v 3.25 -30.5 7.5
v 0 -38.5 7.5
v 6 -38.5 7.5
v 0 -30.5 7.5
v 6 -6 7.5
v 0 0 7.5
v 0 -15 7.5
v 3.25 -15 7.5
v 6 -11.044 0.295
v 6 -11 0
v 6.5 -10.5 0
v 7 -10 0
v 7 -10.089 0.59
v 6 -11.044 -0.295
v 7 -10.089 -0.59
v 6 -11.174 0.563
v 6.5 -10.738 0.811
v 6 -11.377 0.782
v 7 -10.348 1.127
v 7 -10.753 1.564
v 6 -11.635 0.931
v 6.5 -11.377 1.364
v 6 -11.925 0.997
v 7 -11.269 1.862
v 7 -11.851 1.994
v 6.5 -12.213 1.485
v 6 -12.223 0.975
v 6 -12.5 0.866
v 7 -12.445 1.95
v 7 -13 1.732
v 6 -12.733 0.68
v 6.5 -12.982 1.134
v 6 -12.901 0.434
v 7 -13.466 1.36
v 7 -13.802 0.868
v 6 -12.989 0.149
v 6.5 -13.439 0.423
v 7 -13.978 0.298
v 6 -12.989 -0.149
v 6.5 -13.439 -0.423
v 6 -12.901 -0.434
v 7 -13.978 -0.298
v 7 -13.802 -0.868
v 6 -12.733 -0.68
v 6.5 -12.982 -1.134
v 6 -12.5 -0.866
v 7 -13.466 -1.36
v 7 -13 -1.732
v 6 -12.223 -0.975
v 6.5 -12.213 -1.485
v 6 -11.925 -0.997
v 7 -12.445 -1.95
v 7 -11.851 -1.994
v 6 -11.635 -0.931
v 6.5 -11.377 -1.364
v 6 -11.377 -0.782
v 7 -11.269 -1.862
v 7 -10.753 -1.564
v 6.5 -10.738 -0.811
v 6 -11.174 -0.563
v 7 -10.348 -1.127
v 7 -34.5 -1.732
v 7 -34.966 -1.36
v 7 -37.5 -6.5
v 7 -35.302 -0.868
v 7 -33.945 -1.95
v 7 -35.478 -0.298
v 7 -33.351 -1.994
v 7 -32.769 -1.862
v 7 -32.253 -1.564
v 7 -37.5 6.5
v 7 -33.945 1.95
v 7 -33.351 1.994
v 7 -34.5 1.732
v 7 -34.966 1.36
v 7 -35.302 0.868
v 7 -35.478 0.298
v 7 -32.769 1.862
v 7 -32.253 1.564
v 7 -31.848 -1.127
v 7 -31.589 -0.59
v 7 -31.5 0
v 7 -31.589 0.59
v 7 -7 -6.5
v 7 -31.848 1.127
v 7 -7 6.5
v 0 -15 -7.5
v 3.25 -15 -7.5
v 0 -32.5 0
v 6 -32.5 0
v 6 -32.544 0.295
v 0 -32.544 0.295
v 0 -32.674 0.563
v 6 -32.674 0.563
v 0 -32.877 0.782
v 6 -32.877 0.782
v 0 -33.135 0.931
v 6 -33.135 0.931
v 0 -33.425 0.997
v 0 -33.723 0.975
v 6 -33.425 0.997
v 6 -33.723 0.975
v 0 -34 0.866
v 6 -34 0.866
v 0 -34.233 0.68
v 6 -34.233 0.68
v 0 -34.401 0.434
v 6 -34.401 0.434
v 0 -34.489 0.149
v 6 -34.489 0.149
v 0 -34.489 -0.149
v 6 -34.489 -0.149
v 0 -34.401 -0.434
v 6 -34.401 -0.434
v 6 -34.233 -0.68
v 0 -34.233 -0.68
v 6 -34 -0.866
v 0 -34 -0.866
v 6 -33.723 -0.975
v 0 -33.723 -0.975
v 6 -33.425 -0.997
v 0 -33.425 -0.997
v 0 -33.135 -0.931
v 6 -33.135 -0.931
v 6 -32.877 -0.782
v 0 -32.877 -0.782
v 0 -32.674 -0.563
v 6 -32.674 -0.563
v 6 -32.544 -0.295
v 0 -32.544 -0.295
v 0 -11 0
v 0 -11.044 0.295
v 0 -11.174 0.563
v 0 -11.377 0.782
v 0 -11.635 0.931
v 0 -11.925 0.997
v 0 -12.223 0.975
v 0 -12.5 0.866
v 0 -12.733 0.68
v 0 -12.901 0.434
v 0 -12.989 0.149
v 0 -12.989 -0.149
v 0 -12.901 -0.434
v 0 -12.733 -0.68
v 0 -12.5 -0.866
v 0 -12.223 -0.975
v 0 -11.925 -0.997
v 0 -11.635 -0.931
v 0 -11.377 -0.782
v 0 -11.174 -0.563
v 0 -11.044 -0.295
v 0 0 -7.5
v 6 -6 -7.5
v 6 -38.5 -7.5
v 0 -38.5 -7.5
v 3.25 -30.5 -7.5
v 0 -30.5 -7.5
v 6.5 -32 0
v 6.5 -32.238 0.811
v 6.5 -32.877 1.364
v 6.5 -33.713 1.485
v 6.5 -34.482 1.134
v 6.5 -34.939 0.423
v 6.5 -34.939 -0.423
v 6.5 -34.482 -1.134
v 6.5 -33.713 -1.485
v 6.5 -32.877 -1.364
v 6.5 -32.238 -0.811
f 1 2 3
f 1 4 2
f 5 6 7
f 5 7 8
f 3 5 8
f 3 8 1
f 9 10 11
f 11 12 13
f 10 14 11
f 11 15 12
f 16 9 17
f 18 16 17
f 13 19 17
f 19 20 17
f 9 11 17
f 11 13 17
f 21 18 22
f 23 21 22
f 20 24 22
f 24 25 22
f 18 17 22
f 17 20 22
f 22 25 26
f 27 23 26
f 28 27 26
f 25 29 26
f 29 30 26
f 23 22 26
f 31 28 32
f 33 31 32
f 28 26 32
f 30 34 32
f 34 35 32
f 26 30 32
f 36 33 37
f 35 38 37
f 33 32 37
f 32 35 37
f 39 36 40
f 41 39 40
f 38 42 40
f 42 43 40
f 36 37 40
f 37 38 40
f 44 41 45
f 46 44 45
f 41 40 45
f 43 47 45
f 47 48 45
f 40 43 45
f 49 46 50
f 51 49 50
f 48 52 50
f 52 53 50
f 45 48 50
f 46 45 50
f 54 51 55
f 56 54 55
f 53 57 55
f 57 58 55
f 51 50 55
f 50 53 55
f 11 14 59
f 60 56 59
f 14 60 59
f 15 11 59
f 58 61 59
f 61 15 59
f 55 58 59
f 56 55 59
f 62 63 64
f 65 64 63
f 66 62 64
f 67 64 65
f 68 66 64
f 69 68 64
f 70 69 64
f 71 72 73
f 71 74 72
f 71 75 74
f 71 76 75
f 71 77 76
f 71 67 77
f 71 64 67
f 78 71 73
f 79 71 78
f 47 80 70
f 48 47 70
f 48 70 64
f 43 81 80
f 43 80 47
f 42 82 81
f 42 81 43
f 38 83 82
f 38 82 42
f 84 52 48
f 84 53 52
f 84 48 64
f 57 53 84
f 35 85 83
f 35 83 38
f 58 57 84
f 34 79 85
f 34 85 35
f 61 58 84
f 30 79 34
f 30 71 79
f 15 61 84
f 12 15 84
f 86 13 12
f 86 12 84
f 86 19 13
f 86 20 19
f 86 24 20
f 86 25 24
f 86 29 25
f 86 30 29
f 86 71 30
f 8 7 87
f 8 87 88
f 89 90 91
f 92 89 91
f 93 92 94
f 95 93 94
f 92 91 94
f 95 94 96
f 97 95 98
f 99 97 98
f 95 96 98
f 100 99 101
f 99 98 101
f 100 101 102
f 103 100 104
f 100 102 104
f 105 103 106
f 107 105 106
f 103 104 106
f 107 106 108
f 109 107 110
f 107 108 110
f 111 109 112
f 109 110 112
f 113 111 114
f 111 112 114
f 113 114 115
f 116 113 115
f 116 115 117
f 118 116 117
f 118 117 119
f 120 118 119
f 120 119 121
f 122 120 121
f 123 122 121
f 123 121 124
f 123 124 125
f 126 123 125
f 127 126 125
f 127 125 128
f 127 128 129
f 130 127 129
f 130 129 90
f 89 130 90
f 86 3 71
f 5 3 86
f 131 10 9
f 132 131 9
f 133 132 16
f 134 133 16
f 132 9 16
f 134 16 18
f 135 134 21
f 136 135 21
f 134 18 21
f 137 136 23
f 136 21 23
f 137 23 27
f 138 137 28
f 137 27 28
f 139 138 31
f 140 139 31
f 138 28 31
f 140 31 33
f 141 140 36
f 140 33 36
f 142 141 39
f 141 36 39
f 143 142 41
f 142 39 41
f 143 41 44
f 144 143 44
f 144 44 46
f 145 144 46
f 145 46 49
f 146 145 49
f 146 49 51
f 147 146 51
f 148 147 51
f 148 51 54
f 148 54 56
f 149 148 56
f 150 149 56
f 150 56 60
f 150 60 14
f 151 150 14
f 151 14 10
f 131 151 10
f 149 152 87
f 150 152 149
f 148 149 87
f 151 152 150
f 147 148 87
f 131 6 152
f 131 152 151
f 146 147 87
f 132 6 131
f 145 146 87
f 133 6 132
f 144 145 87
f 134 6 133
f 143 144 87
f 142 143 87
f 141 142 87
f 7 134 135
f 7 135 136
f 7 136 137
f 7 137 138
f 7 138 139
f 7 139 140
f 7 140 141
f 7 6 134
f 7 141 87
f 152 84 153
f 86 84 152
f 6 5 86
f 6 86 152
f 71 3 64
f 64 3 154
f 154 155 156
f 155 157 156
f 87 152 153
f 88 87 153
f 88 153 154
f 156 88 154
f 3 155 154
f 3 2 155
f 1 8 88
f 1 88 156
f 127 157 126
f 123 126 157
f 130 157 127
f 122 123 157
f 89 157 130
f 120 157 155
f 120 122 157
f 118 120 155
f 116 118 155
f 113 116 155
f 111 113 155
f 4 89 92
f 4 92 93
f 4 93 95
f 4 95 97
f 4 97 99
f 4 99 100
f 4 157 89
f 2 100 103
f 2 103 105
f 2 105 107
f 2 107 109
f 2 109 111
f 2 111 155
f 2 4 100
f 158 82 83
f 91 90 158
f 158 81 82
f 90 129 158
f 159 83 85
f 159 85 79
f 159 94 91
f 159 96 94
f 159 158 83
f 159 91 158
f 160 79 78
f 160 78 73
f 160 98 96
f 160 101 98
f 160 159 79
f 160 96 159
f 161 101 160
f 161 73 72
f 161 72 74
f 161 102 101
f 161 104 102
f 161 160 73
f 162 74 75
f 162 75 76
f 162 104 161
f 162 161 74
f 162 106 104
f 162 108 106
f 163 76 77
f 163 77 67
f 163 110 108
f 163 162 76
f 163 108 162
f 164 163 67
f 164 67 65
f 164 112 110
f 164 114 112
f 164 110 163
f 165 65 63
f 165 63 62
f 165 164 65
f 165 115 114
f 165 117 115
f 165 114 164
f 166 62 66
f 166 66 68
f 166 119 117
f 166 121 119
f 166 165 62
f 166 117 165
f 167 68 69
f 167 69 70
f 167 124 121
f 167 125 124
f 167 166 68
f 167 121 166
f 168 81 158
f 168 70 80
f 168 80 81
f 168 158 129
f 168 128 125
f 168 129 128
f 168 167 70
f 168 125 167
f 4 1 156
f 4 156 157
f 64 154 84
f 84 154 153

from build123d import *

# Parameters (mm, degrees)
PAD_DEPTH       = 7.5
SKETCH001_R     = 1
POCKET_DEPTH    = 7.001
CHAMFER_SIZE    = 1
CHAMFER001_SIZE = 1


with BuildPart() as part:
    # Sketch → Pad (new body, symmetric)
    with BuildSketch(Plane.XY):
        Polygon((0, 0), (0, -15), (3.25, -15), (3.25, -30.5), (0, -30.5), (0, -38.5), (7, -38.5), (7, -7), align=None)
    extrude(amount=PAD_DEPTH, both=True)

    # Sketch001 (on Face7 of Pad) → Pocket (cut, through all)
    with BuildSketch(Plane.YZ.offset(7)):
        with Locations((-33.5, 0)):
            Circle(SKETCH001_R)
        with Locations((-12, 0)):
            Circle(SKETCH001_R)
    extrude(amount=-POCKET_DEPTH, mode=Mode.SUBTRACT)

    # Chamfer
    chamfer_edges = [part.edges().sort_by_distance(p)[0] for p in [
        (7, -13, 0),
        (7, -34.5, 0),
    ]]
    chamfer(chamfer_edges, length=CHAMFER_SIZE)

    # Chamfer001
    chamfer001_edges = [part.edges().sort_by_distance(p)[0] for p in [
        (7, -22.75, 7.5),
        (7, -38.5, 0),
        (7, -22.75, -7.5),
    ]]
    chamfer(chamfer001_edges, length=CHAMFER001_SIZE)


solid = part.part
